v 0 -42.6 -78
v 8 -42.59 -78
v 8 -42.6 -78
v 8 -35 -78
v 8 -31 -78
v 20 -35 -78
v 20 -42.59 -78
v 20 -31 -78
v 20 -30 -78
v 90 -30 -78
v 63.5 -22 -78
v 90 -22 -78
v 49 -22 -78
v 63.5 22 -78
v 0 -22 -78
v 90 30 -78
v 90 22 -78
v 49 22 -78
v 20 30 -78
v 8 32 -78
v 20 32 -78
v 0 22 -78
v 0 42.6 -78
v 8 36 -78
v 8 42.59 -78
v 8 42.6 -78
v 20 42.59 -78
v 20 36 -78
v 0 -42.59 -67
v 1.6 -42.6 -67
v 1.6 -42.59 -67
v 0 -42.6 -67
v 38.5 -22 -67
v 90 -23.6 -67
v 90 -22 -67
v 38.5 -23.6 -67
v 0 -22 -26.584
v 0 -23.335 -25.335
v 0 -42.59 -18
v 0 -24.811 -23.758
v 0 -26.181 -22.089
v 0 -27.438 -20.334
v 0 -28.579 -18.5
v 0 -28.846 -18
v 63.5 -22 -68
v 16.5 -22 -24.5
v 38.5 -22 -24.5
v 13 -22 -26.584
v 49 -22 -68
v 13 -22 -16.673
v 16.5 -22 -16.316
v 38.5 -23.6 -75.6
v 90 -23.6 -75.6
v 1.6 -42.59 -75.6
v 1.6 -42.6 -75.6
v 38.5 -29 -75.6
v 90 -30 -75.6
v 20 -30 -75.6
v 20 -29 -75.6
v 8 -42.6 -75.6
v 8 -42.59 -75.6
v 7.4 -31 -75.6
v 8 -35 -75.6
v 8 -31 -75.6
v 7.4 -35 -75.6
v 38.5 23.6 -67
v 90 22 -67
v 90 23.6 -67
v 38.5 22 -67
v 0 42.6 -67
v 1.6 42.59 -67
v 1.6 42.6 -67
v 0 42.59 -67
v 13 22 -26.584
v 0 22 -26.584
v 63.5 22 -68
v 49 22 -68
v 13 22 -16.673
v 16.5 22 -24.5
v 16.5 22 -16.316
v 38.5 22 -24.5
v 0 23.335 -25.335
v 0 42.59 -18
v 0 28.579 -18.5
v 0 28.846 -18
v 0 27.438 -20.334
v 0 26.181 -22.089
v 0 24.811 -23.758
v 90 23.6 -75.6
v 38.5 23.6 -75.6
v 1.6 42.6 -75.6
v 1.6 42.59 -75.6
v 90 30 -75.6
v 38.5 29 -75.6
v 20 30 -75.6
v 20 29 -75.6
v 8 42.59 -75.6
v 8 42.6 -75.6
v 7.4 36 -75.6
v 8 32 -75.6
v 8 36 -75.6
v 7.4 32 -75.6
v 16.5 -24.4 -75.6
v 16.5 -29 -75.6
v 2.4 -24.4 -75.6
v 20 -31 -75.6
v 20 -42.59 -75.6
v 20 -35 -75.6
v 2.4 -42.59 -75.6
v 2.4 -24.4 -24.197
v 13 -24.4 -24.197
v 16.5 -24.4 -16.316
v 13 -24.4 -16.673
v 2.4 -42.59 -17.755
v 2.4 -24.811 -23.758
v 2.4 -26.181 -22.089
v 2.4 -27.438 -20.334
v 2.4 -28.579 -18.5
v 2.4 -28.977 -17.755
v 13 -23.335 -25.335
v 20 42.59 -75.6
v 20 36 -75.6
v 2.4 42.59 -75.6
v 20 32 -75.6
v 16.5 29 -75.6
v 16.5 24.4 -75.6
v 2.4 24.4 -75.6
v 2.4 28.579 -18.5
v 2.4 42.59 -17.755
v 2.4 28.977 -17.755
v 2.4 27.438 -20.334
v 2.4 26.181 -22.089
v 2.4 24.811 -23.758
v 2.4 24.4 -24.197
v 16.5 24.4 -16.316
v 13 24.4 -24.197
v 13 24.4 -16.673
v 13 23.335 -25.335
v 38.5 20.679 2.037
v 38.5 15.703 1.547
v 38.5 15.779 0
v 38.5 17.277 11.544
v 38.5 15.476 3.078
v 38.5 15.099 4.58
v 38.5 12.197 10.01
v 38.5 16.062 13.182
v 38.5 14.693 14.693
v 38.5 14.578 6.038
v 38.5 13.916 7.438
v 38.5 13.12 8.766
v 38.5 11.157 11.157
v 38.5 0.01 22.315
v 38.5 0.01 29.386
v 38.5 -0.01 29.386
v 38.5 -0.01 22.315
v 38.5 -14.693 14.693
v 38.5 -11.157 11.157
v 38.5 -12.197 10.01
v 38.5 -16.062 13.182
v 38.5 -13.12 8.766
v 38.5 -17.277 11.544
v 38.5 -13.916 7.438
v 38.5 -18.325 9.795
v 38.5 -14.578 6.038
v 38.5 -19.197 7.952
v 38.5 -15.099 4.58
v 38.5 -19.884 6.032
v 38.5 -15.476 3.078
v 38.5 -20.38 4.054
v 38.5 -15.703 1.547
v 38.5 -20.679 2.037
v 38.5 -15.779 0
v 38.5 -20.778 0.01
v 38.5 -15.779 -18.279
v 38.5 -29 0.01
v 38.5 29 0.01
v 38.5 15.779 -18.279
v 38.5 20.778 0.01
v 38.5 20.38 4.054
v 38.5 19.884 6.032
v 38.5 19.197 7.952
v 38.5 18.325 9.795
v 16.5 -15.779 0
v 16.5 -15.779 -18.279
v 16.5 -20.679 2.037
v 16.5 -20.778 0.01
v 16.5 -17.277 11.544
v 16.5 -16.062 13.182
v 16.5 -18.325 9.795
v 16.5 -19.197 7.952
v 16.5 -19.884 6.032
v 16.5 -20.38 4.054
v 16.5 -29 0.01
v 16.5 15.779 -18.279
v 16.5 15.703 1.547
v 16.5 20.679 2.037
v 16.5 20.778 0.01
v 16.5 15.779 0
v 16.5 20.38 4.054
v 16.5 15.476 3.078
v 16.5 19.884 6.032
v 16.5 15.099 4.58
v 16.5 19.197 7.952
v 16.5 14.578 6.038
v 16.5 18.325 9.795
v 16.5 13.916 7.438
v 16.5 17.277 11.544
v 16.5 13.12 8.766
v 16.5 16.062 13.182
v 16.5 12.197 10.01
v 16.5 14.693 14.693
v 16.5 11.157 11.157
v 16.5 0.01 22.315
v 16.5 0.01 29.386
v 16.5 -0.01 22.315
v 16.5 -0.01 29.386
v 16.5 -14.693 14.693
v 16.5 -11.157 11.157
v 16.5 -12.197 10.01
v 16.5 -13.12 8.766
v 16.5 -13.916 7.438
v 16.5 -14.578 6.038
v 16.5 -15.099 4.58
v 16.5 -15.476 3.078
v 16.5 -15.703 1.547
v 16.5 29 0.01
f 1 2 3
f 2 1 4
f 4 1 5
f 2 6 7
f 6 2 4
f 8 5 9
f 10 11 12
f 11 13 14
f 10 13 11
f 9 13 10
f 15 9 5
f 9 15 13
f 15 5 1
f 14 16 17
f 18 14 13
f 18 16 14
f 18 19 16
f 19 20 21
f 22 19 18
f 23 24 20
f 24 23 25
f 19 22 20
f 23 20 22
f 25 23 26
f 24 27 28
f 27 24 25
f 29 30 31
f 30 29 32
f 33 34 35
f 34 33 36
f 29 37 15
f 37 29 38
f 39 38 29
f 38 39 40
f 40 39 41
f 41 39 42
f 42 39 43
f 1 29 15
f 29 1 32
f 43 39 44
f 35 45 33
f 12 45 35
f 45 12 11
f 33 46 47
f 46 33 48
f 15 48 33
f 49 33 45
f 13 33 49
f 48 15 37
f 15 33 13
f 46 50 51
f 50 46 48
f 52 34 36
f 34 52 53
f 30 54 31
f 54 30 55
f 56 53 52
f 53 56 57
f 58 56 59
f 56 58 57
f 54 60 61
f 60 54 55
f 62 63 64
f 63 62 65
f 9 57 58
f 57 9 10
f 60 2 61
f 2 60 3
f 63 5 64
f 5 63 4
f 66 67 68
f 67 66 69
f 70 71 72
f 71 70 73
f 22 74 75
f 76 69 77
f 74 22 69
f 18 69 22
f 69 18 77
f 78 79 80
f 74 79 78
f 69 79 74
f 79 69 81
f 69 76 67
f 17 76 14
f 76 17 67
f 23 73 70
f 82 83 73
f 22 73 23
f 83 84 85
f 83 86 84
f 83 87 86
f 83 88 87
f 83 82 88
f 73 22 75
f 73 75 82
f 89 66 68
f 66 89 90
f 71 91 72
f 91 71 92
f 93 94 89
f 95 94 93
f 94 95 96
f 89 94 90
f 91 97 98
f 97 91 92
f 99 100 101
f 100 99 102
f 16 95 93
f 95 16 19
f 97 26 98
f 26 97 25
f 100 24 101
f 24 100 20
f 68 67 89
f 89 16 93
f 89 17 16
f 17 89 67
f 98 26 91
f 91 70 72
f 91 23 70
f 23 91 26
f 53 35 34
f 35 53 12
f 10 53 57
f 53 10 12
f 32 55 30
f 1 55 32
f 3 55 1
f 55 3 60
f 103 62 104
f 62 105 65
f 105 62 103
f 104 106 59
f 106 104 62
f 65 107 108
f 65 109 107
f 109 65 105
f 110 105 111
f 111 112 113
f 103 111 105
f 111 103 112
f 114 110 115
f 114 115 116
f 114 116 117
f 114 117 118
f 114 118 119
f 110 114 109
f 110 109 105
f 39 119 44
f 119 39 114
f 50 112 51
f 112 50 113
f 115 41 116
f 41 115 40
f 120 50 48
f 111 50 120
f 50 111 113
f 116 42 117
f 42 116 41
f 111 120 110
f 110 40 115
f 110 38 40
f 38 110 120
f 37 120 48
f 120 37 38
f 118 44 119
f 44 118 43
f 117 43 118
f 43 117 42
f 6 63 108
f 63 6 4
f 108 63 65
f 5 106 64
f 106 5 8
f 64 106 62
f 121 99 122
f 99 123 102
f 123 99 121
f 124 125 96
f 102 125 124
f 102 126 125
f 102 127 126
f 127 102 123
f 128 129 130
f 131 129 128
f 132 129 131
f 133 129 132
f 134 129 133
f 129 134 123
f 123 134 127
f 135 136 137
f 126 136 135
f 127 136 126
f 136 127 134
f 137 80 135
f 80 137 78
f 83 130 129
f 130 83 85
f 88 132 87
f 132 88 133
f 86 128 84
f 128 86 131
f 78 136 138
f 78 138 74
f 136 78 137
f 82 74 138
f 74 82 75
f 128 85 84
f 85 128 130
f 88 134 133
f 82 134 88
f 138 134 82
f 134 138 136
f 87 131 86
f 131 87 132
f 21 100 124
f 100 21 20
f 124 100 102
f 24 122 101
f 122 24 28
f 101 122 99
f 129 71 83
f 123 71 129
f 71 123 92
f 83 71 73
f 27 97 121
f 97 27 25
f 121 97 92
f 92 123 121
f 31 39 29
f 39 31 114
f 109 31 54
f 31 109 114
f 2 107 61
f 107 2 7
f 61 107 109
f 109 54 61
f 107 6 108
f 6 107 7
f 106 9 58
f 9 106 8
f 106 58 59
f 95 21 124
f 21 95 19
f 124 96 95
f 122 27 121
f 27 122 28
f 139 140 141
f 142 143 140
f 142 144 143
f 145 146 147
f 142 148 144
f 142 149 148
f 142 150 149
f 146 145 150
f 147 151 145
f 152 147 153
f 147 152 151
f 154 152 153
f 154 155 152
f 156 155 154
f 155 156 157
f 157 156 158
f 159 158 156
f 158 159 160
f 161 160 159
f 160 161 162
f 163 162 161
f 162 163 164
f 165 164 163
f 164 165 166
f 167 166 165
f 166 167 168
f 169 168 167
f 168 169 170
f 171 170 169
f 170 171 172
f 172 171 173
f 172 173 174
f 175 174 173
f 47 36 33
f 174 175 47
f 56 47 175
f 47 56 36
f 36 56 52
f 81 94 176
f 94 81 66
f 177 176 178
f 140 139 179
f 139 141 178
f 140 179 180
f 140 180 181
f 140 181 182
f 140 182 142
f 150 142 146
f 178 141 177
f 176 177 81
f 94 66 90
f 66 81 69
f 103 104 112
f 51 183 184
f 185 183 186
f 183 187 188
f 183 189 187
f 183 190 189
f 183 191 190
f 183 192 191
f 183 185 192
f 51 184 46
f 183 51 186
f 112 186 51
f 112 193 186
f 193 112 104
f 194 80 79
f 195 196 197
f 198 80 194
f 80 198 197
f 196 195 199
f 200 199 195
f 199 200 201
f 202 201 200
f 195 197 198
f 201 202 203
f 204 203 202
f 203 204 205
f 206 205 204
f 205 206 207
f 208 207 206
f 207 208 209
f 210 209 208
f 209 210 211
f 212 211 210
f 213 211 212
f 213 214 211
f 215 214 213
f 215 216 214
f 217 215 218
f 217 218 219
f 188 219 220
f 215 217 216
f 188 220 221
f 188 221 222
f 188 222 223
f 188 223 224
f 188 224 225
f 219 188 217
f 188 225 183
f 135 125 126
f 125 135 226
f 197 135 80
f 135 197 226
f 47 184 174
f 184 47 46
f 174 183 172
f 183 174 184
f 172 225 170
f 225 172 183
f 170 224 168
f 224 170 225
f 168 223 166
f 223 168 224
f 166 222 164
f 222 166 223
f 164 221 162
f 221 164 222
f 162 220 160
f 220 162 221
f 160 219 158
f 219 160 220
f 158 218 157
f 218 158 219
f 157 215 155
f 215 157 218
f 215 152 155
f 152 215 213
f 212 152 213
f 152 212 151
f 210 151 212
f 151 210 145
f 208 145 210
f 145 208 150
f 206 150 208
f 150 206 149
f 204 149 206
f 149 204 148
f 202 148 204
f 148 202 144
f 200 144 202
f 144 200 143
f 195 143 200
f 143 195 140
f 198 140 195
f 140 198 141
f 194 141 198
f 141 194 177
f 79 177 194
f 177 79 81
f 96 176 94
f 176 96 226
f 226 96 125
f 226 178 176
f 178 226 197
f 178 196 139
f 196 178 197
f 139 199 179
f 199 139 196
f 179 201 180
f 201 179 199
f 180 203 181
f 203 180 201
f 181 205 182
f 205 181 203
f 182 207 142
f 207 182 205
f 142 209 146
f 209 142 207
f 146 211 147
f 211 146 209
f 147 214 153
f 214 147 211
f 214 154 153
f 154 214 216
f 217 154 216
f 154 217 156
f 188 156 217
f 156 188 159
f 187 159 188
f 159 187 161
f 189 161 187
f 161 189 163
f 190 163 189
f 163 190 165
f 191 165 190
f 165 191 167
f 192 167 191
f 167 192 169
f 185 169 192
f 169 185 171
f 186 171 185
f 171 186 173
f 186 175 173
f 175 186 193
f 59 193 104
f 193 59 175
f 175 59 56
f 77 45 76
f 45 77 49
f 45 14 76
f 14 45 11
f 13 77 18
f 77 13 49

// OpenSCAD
// =====================================================================
//  PORTASHAMPOO PER RACCORDO DOCCINO  —  v5 DEFINITIVA (16/11/2026)
//  Parametrico: modifica le misure qui sotto e riesporta lo STL
//  (OpenSCAD: F6 = render, poi File > Export > STL).
//
//  Sistema di riferimento (stando nella doccia, guardando la parete):
//    X = orizzontale lungo il muro (+ verso l'angolo a destra)
//    Y = uscente dal muro verso di te (muro a Y = 0)
//    Z = verticale; l'asse del raccordo è a X = 0, Z = 0
//
//  v4 = v2 + modifiche dopo la prova + disegno di Nico del 29/10:
//   - base 1 (sinistra, quadrati 1-6): +5 mm a sinistra, +10 mm di profondità;
//     lato interno a 22 mm come la base 2 (parete dentro la colonna, a specchio)
//   - base 2 (destra, quadrati 7-8): +16 mm verso la parete laterale
//   - niente piedini: il fondo e la parete posteriore arrivano dritti fino
//     alle piastrelle per tutta la larghezza, anche sotto la rosetta
//   - distanziatore a pavimento tra la base 1 e la base 2, centrato sui
//     quadrati 6 e 8 (fila davanti)
//   - base 1 accorciata di 10 mm a sinistra (ingombro 240 mm)
//   - prototipo veloce: colonne 30 mm più basse
//   - "stampa_..." = pezzo già ruotato di 90° per entrare nel piatto
//
//  v5 (dopo la prova del prototipo v4):
//   - distanziatore da 50 a 63 mm dal muro (dietro al flessibile del doccino)
//   - gancio e colonne 4 mm più lontani dal muro
//   - fondo all'altezza del prototipo (78 mm sotto l'asse del raccordo)
//   - pareti più basse dietro e alte 70 mm davanti
//   - angolo sotto la rosetta smussato seguendo la rosetta
// =====================================================================

// ---------- QUALE PEZZO GENERARE ----------
// "stampa_rapido"   = prototipo veloce, già ruotato per il piatto (da usare in Cura)
// "stampa_bisaccia" = versione completa, già ruotata per il piatto (da usare in Cura)
// "rapido" / "bisaccia" = stessi pezzi orientati come in doccia
// "scena_rapido" / "scena_bisaccia" = anteprima con muri, raccordo, flessibili e doccino
design = "stampa_rapido";

// ---------- MISURE DEL BAGNO ----------
tubo_d        = 96 / PI; // corpo del raccordo: circonferenza 96 mm -> Ø 30,6 (confermato dal prototipo)
rosetta_d     = 60;      // diametro rosetta (stima)
rosetta_sp    = 11;      // spessore rosetta dal muro (dalla prova: i piedini restavano a 3 mm dal muro)
// misure prese dalla faccia della rosetta, lungo il raccordo:
att_da        = 16;      // 1° tubo (attacco acqua, sotto al raccordo): da 16 ...
att_a         = 26;      // ... a 26 mm
doc_da        = 52;      // 2° tubo (flessibile che entra nel porta-doccino): da 52 ...
doc_a         = 66;      // ... a 66 mm
tubo_fine     = 72;      // fine del raccordo dalla rosetta (stima)
doccino_d     = 24;      // diametro del doccino (stima)
angolo_x      = 96;      // asse raccordo -> parete laterale destra (dalla prova: mancavano 16 mm)
miscelatore_x = -188;    // bordo del miscelatore a sinistra (stima da scan)

// ---------- GANCIO ----------
gioco         = 0.5;     // gioco radiale tra gancio e raccordo
anello_y0     = rosetta_sp + 5.5;   // v5: gancio 4 mm più lontano dal muro (16,5 mm)
anello_l      = 22;      // lunghezza del gancio sopra al raccordo (resta prima del doccino)
anello_sp     = 5;       // spessore radiale del gancio
avvolgimento  = 180;     // gradi di avvolgimento sopra al raccordo
arco_goccia   = true;    // arco a goccia: stampabile in piedi senza supporti

// ---------- BASI ----------
parete        = 2.4;     // pareti (6 perimetri da 0,4)
fondo         = 2.4;
box_y0        = rosetta_sp + 2;  // davanti alla rosetta la parete posteriore sta qui
box_prof      = 85;      // profondità da box_y0 al bordo anteriore
fondo_z       = -78;     // quota del fondo rispetto all'asse del raccordo (come il prototipo)
h_dietro      = 60;      // altezza delle pareti contro il muro (vicino alla rosetta interviene lo smusso)
h_davanti     = 70;      // altezza delle pareti davanti
rosetta_margine = 3;     // smusso sotto la rosetta: raggio = rosetta + 3 mm
smusso_abbassa = 2;      // smusso abbassato di altri 2 mm (dopo la prova)
box_sx        = -145;    // estremo sinistro (base 1 accorciata di 10 mm: ingombro 240 mm)
varco         = 22;      // base 2: lato interno a 22 mm dall'asse
varco_sx      = varco;   // base 1: lato interno a 22 mm, come la base 2 (la parete passa dentro la colonna)
asola_l       = 4;       // asole di scarico nel fondo
asola_passo   = 10;
traverse      = 2;       // traverse orizzontali nel fondo (versione definitiva)
traversa_l    = 6;       // larghezza di ogni traversa
// distanziatore a pavimento tra le due basi (oggetto blu del disegno)
dist_h        = 10;      // altezza
dist_da       = 49;      // inizio, dal muro (allargato di 1 mm verso il muro)
dist_a        = 63.5;    // fine, dal muro (allargato di 0,5 mm verso l'esterno)

$fn = 64;

// ---------- valori derivati ----------
R      = tubo_d / 2;
ri     = R + gioco;
ro     = ri + anello_sp;
ay1    = anello_y0 + anello_l;
zb     = fondo_z;
box_top = zb + h_dietro;             // (usato per il riempimento sotto le colonne)
by1    = box_y0 + box_prof;          // bordo anteriore
box_dx = angolo_x - 1;               // 1 mm dalla parete laterale
y_att  = rosetta_sp + (att_da + att_a) / 2;
y_doc  = rosetta_sp + (doc_da + doc_a) / 2;
y_mez  = by1 / 2;                    // traversina lunga del prototipo (divide dietro/davanti)

// =====================================================================
//  GANCIO: arco sopra al raccordo + due montanti verso il box
// =====================================================================
// profilo "a goccia": sopra al raccordo le superfici non superano i 45° di sbalzo,
// così l'arco si stampa in piedi SENZA supporti e senza colature dove appoggia.
module goccia(r) {
    if (arco_goccia) hull() { circle(r = r); translate([0, r * sqrt(2) - 0.01]) square(0.02, center = true); }
    else circle(r = r);
}
module profilo_anello() {
    big = ro * 3;
    difference() {
        goccia(ro);
        goccia(ri);
        polygon(concat([[0, 0]],
            [for (a = [avvolgimento / 2 : 5 : 360 - avvolgimento / 2]) [big * sin(a), big * cos(a)]],
            [[big * sin(360 - avvolgimento / 2), big * cos(360 - avvolgimento / 2)]]));
    }
}

// montante: accanto al raccordo sta fuori dal tubo (x >= ri), sotto si sposta fino a x_in
// con uno smusso a 45° (nessun gradino orizzontale sospeso)
module profilo_montante(lato, z_fine, x_in) {
    xo = max(ro + 2, x_in + 7);
    zs = -R - 3;                    // sotto questa quota il montante può rientrare verso il centro
    mirror([lato < 0 ? 1 : 0, 0])
    polygon([[x_in, z_fine], [xo, z_fine], [xo, 0.01], [ri, 0.01], [ri, zs], [x_in, zs - (x_in - ri)]]);
}

module gancio(z_sx, z_dx, x_in_sx, x_in_dx) {
    translate([0, ay1, 0]) rotate([90, 0, 0])
    linear_extrude(anello_l)
    union() {
        profilo_anello();
        profilo_montante(-1, z_sx, x_in_sx);
        profilo_montante( 1, z_dx, x_in_dx);
    }
}

// =====================================================================
//  BASI: pianta dritta fino alle piastrelle
// =====================================================================
// pianta 2D di una base: rettangolo dritto fino alle piastrelle (Y = 0).
// Vicino al centro la base passa SOTTO la rosetta (la rosetta finisce più in alto
// del bordo delle basi), quindi niente rientro.
module pianta(x0, x1, xr) {
    translate([x0, 0]) square([x1 - x0, by1]);
}

module taglio_bordo() {
    // piano dal bordo dietro (h_dietro, contro il muro) al bordo davanti (h_davanti)
    ang = atan((h_davanti - h_dietro) / by1);
    translate([-400, 0, zb + h_dietro]) rotate([ang, 0, 0])
        translate([0, -60, 0]) cube([800, 400, 200]);
}

// smusso sotto la rosetta: toglie dalle basi il volume vicino alla rosetta
module smusso_rosetta() {
    translate([0, -1, -smusso_abbassa]) rotate([-90, 0, 0])
        cylinder(r = rosetta_d / 2 + rosetta_margine, h = rosetta_sp + 2 + 1, $fn = 96);
}

module asole2d(x0, x1) {
    intersection() {
        offset(delta = -(parete + 5)) pianta(x0, x1, xr_di(x0, x1));
        difference() {
            for (x = [x0 : asola_passo : x1]) translate([x, -10]) square([asola_l, by1 + 20]);
            // traverse orizzontali (da sinistra a destra) che irrigidiscono il piano
            for (i = [1 : traverse]) translate([x0 - 1, i * by1 / (traverse + 1) - traversa_l / 2]) square([x1 - x0 + 2, traversa_l]);
        }
    }
}
function xr_di(x0, x1) = 0;   // (non più usato: niente rientro attorno alla rosetta)

module base(x0, x1) {
    xr = xr_di(x0, x1);
    difference() {
        translate([0, 0, zb]) linear_extrude(h_davanti + 1) pianta(x0, x1, xr);
        translate([0, 0, zb + fondo]) linear_extrude(h_davanti + 1) offset(delta = -parete) pianta(x0, x1, xr);
        taglio_bordo();
        smusso_rosetta();
        translate([0, 0, zb - 1]) linear_extrude(fondo + 2) asole2d(x0, x1);
    }
}

// versione "telaio" per la prova veloce: solo cornice del fondo + bordino basso (dentro vuoto)
lab_h = 11;     // altezza del bordino (prototipo veloce: 11 mm)
lab_s = 1.6;    // spessore del bordino
module base_rapido(x0, x1, colonne) {
    xr = xr_di(x0, x1);
    translate([0, 0, zb]) union() {
        linear_extrude(lab_h) difference() { pianta(x0, x1, xr); offset(delta = -lab_s) pianta(x0, x1, xr); }
        linear_extrude(fondo) difference() { pianta(x0, x1, xr); offset(delta = -8) pianta(x0, x1, xr); }
    }
}

module distanziatore() {
    translate([-varco_sx - 1, dist_da, zb]) cube([varco_sx + varco + 2, dist_a - dist_da, dist_h]);
}

// PROTOTIPO VELOCE v5: solo la parte centrale della versione definitiva
// (arco, colonne, segmenti di base attorno, spacer, muretti con lo smusso sotto la rosetta)
rap_x      = 45;     // larghezza tenuta per lato, dall'asse
rap_muro_y = 20;     // fino a questa distanza dal muro le pareti restano alte (muretti dello smusso)
// parti tenute del bordino/fondo: segmento interno lungo la colonna + striscia lungo il muro
// (tolti i lati esterni e la testata davanti, come indicato da Nico)
module maschera_lato() {
    translate([varco - 1, -1, zb - 1]) cube([1 + 8, by1 - 8 + 1, 50]);                 // segmento interno
    translate([varco - 1, -1, zb - 1]) cube([rap_x - parete - varco + 1, 8 + 1, 50]);  // striscia lungo il muro
}
module prototipo_v5() {
    union() {
        intersection() {
            union() { base_rapido(-rap_x, -varco_sx, 1); base_rapido(varco, rap_x, 1); }
            union() { maschera_lato(); mirror([1, 0, 0]) maschera_lato(); }
        }
        // muretti alti verso il muro, con lo smusso sotto la rosetta, senza il lato esterno
        intersection() {
            union() { base(-rap_x, -varco_sx); base(varco, rap_x); }
            translate([-(rap_x - parete - 0.01), -1, zb - 1]) cube([2 * (rap_x - parete - 0.01), rap_muro_y + 1, h_davanti + 2]);
        }
        gancio(zb, zb, varco, varco);
        distanziatore();
    }
}

module bisaccia(rapido = false) {
    union() {
        if (rapido) { base_rapido(box_sx, -varco_sx, 3); base_rapido(varco, box_dx, 1); }
        else        { base(box_sx, -varco_sx);           base(varco, box_dx); }
        distanziatore();
        gancio(zb, zb, varco, varco);
    }
}

// =====================================================================
//  SCENA DI ANTEPRIMA (non stampare)
// =====================================================================
module ambiente(con_doccino = true) {
    color([0.25, 0.25, 0.27]) translate([-260, -6, -220]) cube([260 + angolo_x, 6, 420]);       // muro
    color([0.30, 0.30, 0.32]) translate([angolo_x, -6, -220]) cube([6, 260, 420]);              // parete laterale
    color("silver") rotate([-90, 0, 0]) cylinder(d = rosetta_d, h = rosetta_sp);               // rosetta
    color("silver") rotate([-90, 0, 0]) cylinder(d = tubo_d, h = rosetta_sp + tubo_fine);      // raccordo
    color([0.75, 0.75, 0.78]) translate([0, y_att, -R + 2]) mirror([0, 0, 1])                   // 1° flessibile
        cylinder(d = att_a - att_da, h = 220);
    if (con_doccino) {
    color([0.75, 0.75, 0.78]) translate([0, y_doc, -R + 2]) mirror([0, 0, 1])                   // 2° flessibile
        cylinder(d = doc_a - doc_da, h = 220);
    color("silver") translate([0, y_doc, R - 4]) cylinder(d = doccino_d, h = 165);             // doccino in piedi
    }
    color([0.8, 0.8, 0.85, 0.5]) translate([miscelatore_x - 50, 0, -100]) cube([50, 45, 140]); // miscelatore
}

module flaconi_demo(xs, ds) {
    for (i = [0 : len(xs) - 1]) color([0.2, 0.55, 0.85])
        translate([xs[i], by1 / 2, zb + fondo]) cylinder(d = ds[i], h = 190);
}

// =====================================================================
// orientato(): come in doccia, vista "Front" di OpenSCAD = dalla doccia
module orientato() { mirror([0, 1, 0]) children(); }
if (design == "stampa_rapido")   rotate([0, 0, 90]) orientato() prototipo_v5();
if (design == "stampa_bisaccia") rotate([0, 0, 90]) orientato() bisaccia();
orientato() {
    if (design == "rapido")   prototipo_v5();
    if (design == "bisaccia") bisaccia();
    if (design == "ambiente") ambiente();
    if (design == "ambiente_montaggio") ambiente(false);
    if (design == "scena_rapido")   { ambiente(); color("orange") prototipo_v5(); }
    if (design == "scena_bisaccia") { ambiente(); color("orange") bisaccia();     flaconi_demo([-120, -55, 58], [65, 65, 62]); }
}
